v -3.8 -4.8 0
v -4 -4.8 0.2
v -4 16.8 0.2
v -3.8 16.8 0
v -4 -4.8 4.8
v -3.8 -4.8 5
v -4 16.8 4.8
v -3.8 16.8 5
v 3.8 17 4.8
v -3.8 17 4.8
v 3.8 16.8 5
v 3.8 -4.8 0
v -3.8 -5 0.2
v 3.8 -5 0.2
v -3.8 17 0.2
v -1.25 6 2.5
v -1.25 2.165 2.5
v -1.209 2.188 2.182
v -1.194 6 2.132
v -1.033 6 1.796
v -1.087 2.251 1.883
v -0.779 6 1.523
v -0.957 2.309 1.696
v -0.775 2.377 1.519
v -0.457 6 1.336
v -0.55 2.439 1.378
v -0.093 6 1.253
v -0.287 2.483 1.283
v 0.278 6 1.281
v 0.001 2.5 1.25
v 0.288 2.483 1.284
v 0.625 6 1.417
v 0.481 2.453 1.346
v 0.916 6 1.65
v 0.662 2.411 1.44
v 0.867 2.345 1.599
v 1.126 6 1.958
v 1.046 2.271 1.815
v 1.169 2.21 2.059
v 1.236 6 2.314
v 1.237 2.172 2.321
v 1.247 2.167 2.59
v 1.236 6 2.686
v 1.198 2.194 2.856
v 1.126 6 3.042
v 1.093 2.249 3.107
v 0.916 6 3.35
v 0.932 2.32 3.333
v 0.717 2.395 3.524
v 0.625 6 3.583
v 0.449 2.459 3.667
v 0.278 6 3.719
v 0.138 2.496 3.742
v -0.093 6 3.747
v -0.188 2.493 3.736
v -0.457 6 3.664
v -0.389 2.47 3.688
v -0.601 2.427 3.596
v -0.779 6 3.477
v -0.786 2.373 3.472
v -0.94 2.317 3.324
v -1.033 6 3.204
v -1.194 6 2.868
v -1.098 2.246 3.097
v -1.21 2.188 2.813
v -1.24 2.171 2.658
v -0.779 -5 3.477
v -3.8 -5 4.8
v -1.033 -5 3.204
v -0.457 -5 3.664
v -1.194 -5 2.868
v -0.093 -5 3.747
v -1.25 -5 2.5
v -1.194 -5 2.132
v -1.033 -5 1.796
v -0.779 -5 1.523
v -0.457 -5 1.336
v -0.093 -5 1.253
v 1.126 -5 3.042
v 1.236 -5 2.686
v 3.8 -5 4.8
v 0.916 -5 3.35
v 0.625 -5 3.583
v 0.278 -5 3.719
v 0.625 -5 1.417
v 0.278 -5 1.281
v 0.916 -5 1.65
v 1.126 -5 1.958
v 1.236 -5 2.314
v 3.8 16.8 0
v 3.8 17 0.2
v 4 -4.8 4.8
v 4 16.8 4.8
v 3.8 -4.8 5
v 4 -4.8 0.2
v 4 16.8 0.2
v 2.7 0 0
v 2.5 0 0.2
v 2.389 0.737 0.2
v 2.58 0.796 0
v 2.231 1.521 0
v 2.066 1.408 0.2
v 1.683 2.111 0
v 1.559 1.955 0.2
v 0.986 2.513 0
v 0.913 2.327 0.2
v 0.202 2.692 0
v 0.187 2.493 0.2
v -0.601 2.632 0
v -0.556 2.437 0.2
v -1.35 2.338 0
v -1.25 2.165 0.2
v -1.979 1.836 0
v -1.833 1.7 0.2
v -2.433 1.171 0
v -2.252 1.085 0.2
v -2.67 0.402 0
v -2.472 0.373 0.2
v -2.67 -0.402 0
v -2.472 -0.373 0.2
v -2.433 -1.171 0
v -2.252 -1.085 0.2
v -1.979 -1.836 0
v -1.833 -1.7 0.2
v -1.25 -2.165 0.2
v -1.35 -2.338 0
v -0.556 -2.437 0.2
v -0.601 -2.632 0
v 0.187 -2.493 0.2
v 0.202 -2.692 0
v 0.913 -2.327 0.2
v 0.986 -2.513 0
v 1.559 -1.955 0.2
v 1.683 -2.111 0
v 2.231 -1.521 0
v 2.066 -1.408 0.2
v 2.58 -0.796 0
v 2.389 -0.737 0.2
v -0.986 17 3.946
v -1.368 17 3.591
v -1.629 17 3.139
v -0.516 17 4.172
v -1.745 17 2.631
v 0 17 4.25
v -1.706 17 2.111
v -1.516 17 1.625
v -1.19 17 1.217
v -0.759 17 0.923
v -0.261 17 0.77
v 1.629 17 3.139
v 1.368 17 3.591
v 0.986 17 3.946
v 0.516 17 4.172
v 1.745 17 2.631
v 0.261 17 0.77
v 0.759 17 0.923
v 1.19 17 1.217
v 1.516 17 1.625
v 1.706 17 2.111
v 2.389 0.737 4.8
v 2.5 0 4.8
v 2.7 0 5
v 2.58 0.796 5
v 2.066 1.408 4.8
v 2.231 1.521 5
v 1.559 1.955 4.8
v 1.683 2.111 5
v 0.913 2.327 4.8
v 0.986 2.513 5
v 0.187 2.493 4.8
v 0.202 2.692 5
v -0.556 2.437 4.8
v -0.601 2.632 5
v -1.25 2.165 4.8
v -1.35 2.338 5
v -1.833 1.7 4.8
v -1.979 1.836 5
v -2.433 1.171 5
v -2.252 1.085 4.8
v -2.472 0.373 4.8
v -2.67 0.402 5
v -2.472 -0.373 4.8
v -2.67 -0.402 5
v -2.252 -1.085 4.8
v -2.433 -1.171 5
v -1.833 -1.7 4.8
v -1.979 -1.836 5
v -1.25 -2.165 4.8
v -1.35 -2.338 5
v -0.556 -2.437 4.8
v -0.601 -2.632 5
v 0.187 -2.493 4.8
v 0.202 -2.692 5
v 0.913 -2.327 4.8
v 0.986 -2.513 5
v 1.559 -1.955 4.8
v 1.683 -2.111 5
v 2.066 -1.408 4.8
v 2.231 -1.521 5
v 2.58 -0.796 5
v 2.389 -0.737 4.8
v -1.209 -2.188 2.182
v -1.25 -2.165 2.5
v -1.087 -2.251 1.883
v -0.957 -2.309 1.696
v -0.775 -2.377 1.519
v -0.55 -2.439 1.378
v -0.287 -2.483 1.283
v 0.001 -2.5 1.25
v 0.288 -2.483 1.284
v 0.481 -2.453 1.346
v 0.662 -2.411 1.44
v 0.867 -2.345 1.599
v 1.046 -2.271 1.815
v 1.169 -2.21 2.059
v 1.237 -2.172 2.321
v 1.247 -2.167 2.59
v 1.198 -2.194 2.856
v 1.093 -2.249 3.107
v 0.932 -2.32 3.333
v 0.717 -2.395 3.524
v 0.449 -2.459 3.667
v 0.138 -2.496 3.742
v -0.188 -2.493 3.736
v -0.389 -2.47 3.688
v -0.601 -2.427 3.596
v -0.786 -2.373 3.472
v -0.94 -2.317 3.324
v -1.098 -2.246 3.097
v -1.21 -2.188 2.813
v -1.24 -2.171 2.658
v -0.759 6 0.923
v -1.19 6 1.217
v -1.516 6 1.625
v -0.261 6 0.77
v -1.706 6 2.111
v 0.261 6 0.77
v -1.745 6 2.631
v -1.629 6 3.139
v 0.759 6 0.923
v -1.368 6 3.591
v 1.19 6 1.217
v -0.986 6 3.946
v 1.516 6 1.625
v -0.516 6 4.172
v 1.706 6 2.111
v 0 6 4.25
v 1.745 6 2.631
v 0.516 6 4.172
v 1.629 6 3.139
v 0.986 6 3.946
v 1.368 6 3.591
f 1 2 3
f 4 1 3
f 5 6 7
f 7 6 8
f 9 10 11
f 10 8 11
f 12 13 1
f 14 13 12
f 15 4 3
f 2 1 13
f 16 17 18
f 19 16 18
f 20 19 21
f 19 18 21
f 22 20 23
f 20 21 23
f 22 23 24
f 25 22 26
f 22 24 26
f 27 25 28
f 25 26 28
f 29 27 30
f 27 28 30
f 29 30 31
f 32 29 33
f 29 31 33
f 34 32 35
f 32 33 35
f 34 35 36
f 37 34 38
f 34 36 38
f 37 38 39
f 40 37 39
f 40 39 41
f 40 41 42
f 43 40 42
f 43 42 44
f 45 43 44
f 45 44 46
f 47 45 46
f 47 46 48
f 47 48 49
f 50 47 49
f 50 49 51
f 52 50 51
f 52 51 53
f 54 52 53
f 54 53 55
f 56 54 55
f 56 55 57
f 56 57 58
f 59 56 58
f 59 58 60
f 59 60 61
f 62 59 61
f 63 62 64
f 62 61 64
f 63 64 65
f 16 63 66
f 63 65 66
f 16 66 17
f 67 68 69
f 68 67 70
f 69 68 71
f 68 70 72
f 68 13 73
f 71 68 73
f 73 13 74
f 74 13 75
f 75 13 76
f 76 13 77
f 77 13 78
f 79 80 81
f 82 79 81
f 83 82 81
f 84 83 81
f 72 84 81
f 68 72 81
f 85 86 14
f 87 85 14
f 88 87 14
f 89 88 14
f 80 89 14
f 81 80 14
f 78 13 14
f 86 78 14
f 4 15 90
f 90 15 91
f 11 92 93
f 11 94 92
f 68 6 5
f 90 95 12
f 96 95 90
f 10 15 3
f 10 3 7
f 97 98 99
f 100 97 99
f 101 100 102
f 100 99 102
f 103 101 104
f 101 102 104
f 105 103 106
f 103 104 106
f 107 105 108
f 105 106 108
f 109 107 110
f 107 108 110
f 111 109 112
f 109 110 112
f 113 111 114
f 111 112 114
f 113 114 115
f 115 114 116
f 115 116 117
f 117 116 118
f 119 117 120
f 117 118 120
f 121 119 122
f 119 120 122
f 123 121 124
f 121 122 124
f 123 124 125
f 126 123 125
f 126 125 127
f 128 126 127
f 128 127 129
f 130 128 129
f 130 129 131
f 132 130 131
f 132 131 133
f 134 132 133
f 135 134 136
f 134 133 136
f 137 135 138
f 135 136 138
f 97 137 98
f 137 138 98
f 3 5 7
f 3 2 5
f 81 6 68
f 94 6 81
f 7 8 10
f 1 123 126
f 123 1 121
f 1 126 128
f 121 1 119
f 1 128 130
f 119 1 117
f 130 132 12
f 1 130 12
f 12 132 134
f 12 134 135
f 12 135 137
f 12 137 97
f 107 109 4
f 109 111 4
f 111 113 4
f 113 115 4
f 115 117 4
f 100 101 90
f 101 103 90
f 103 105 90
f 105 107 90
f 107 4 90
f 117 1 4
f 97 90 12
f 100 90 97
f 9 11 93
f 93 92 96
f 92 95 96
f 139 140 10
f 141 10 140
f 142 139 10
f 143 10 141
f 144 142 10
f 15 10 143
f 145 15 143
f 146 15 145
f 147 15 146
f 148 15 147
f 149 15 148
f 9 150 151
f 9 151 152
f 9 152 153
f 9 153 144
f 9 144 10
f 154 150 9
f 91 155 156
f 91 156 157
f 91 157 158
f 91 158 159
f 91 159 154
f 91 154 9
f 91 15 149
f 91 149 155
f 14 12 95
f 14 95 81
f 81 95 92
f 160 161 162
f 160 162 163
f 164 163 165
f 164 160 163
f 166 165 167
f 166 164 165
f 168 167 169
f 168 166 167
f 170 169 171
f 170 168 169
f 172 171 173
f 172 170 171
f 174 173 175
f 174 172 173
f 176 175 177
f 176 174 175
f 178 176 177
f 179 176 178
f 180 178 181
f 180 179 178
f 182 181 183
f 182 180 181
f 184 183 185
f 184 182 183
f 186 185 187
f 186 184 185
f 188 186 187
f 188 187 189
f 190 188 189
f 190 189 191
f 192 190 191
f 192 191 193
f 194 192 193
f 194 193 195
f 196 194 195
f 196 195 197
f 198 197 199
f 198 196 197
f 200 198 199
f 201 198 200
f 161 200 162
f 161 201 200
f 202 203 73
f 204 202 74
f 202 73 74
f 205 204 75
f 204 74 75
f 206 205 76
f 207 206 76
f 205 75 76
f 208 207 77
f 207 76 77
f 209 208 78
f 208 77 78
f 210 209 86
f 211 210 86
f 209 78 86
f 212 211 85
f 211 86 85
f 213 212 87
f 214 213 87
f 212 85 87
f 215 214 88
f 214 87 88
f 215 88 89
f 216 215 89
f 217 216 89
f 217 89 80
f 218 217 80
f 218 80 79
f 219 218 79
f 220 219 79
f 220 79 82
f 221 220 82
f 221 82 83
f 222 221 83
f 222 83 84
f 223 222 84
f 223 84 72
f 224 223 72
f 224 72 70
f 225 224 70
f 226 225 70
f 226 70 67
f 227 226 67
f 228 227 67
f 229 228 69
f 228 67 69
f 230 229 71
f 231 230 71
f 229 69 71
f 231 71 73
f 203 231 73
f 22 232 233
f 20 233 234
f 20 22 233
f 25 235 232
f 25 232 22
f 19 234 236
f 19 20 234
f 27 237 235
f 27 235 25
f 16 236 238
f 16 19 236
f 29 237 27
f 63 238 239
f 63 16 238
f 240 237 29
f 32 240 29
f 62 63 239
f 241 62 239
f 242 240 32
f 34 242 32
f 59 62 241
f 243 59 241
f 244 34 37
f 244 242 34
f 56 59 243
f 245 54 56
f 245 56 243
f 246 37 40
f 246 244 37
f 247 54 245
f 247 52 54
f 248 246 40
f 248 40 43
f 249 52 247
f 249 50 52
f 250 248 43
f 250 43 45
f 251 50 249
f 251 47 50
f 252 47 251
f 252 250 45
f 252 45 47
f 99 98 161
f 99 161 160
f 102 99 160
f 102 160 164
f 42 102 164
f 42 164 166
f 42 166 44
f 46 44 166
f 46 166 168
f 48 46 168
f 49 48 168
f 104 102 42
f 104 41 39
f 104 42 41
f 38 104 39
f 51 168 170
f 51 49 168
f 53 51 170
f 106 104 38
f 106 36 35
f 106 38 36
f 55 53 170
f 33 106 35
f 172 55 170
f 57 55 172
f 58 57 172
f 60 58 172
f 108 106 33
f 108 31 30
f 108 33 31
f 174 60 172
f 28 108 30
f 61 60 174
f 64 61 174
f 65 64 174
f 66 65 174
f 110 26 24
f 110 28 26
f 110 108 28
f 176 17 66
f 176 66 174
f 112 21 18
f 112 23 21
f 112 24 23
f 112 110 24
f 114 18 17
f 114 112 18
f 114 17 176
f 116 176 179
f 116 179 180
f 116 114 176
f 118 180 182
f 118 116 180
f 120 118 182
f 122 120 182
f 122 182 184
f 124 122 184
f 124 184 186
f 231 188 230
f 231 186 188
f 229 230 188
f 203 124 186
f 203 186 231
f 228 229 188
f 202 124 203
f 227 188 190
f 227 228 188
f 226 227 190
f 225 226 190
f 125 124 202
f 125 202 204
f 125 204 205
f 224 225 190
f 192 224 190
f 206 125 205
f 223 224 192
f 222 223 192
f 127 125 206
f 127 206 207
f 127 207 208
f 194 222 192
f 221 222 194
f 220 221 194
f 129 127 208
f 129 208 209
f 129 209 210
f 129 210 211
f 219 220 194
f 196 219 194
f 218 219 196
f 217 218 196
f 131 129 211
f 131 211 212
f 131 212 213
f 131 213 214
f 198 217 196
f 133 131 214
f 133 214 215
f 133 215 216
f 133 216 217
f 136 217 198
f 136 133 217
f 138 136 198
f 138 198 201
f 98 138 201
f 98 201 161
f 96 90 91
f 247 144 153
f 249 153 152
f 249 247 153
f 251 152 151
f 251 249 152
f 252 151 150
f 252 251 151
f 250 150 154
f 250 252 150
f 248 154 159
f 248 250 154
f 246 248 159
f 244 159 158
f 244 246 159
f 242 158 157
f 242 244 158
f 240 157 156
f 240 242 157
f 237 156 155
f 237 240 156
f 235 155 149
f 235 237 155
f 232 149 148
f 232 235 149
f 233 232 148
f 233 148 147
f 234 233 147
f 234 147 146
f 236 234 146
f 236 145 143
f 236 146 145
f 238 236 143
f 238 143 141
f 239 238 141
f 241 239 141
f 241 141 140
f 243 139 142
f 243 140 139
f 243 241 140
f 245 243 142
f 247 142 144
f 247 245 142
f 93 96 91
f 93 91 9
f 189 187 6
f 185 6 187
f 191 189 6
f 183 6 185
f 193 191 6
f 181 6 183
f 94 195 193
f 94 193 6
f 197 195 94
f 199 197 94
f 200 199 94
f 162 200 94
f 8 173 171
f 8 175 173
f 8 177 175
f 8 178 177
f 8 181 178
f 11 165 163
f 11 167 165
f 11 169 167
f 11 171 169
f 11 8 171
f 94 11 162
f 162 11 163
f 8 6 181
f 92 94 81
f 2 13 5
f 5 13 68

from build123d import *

# Parameters (mm, degrees)
SKIZZE1_W                       = 8
SKIZZE1_H                       = 22
SKIZZE1_R                       = 2.5
AUFSATZ_LINEAR_AUSTRAGEN1_DEPTH = 5
M3_GEWINDEBOHRUNG1_REACH        = 24.913
M3_GEWINDEBOHRUNG1_BORE_R       = 1.25
FASE1_SIZE                      = 0.2
FASE2_SIZE                      = 0.2
SKIZZE4_R                       = 1.75
SCHNITT_LINEAR_AUSTRAGEN1_DEPTH = 13.727922148
M3_GEWINDEBOHRUNG2_D            = 2.5


with BuildPart() as part:
    # Skizze1 → Aufsatz-Linear austragen1 (new body)
    with BuildSketch(Plane.XY):
        with Locations((0, 6)):
            Rectangle(SKIZZE1_W, SKIZZE1_H)
        Circle(SKIZZE1_R, mode=Mode.SUBTRACT)
    extrude(amount=AUFSATZ_LINEAR_AUSTRAGEN1_DEPTH)

    # M3 Gewindebohrung1 bore → M3 Gewindebohrung1 (cut, up to next)
    with BuildSketch(Plane(origin=(0, -5, 0), x_dir=(-1, 0, 0), z_dir=(0, -1, 0)), mode=Mode.PRIVATE) as m3_gewindebohrung1_sk1:
        with Locations((0, -2.5)):
            Circle(M3_GEWINDEBOHRUNG1_BORE_R)
    m3_gewindebohrung1_tool1 = extrude(m3_gewindebohrung1_sk1.sketch, amount=-M3_GEWINDEBOHRUNG1_REACH, mode=Mode.PRIVATE) & part.part
    add(m3_gewindebohrung1_tool1.solids().sort_by_distance((0, -5, 2.5))[0], mode=Mode.SUBTRACT)

    # Fase1
    fase1_edges = [part.edges().sort_by_distance(p)[0] for p in [
        (-2.5, 0, 0),
        (-2.5, 0, 5),
    ]]
    chamfer(fase1_edges, length=FASE1_SIZE)

    # Fase2
    fase2_edges = [part.edges().sort_by_distance(p)[0] for p in [
        (4, 6, 5),
        (0, 17, 5),
        (-4, 6, 5),
        (0, 17, 0),
        (4, 6, 0),
        (0, -5, 0),
        (-4, 6, 0),
        (0, -5, 5),
        (-4, 17, 2.5),
        (4, 17, 2.5),
        (4, -5, 2.5),
        (-4, -5, 2.5),
    ]]
    chamfer(fase2_edges, length=FASE2_SIZE)

    # Skizze4 → Schnitt-Linear austragen1 (cut, through all)
    with BuildSketch(Plane(origin=(0, 6, 0), x_dir=(1, 0, 0), z_dir=(0, 1, 0))):
        with Locations(Location((0, -2.5, 0), (0, 0, 270))):
            Circle(SKIZZE4_R)
    extrude(amount=SCHNITT_LINEAR_AUSTRAGEN1_DEPTH, mode=Mode.SUBTRACT)

    # M3 Gewindebohrung2 (through all)
    with Locations(Plane(origin=(0, 6, 0), x_dir=(1, 0, 0), z_dir=(0, 1, 0))):
        with Locations((0, -2.5)):
            Hole(M3_GEWINDEBOHRUNG2_D / 2)


solid = part.part
